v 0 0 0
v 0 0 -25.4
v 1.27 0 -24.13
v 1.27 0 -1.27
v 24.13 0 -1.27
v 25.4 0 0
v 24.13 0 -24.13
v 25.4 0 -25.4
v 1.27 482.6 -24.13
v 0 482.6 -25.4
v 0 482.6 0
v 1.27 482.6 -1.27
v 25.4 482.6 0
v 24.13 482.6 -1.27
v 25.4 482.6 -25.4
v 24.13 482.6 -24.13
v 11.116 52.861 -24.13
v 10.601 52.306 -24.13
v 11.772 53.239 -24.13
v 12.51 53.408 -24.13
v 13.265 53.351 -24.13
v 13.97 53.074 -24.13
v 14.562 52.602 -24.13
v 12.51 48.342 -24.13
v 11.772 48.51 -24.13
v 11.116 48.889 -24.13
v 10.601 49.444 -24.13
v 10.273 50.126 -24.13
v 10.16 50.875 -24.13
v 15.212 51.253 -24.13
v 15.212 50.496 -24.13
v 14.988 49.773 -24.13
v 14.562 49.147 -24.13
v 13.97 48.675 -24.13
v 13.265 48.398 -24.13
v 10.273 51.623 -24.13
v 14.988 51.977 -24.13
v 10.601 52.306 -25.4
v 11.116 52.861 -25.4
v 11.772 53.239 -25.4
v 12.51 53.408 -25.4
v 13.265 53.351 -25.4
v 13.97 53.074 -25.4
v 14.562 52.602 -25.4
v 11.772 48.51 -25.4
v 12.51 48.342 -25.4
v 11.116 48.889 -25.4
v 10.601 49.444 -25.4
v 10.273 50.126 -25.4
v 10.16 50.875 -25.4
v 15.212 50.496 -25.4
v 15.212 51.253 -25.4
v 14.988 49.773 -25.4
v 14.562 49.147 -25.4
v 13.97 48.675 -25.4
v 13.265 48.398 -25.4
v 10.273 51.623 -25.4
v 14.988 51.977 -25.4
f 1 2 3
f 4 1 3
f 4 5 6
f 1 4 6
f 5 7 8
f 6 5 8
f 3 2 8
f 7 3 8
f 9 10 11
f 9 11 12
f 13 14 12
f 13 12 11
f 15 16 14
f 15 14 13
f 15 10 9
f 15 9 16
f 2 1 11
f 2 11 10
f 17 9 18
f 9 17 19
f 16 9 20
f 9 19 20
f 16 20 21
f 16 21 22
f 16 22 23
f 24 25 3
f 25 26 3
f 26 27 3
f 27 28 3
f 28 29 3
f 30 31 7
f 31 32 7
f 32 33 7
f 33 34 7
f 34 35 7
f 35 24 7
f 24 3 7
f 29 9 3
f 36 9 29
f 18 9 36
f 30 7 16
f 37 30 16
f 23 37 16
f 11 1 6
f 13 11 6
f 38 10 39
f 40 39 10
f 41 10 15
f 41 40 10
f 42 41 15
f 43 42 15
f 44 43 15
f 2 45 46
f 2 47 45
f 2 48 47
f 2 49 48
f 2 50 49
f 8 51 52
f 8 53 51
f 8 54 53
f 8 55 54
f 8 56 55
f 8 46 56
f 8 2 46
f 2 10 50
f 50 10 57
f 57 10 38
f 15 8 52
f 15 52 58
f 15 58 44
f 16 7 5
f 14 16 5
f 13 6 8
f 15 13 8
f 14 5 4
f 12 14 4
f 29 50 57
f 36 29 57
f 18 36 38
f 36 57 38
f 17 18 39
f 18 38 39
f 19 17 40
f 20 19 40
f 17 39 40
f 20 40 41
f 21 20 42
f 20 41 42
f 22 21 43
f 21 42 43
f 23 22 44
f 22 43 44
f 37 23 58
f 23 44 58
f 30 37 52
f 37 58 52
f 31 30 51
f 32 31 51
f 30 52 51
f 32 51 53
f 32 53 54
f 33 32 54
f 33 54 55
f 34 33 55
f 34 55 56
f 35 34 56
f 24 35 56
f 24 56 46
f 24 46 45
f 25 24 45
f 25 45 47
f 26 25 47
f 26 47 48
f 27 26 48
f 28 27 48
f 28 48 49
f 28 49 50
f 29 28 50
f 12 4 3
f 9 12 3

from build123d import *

# Parameters (mm, degrees)
SKETCH1_W           = 25.4
SKETCH1_H           = 25.4
BOSS_EXTRUDE1_DEPTH = 482.6
SKETCH2_R           = 2.54
CUT_EXTRUDE1_DEPTH  = 2.54


with BuildPart() as part:
    # Sketch1 → Boss-Extrude1 (new body)
    with BuildSketch(Plane(origin=(0, 0, 0), x_dir=(1, 0, 0), z_dir=(0, 1, 0))):
        with Locations((12.7, 12.7)):
            Rectangle(SKETCH1_W, SKETCH1_H)
        Polygon((1.27, 12.361459156), (1.27, 24.13), (12.7, 24.13), (24.13, 24.13), (24.13, 12.7), (24.13, 1.27), (12.7, 1.27), (1.27, 1.27), align=None, mode=Mode.SUBTRACT)
    extrude(amount=BOSS_EXTRUDE1_DEPTH)

    # Sketch2 → Cut-Extrude1 (cut)
    with BuildSketch(Plane(origin=(0, 0, -25.4), x_dir=(-1, 0, 0), z_dir=(0, 0, -1))):
        with Locations((-12.7, 50.874750115)):
            Circle(SKETCH2_R)
    extrude(amount=-CUT_EXTRUDE1_DEPTH, mode=Mode.SUBTRACT)


solid = part.part
